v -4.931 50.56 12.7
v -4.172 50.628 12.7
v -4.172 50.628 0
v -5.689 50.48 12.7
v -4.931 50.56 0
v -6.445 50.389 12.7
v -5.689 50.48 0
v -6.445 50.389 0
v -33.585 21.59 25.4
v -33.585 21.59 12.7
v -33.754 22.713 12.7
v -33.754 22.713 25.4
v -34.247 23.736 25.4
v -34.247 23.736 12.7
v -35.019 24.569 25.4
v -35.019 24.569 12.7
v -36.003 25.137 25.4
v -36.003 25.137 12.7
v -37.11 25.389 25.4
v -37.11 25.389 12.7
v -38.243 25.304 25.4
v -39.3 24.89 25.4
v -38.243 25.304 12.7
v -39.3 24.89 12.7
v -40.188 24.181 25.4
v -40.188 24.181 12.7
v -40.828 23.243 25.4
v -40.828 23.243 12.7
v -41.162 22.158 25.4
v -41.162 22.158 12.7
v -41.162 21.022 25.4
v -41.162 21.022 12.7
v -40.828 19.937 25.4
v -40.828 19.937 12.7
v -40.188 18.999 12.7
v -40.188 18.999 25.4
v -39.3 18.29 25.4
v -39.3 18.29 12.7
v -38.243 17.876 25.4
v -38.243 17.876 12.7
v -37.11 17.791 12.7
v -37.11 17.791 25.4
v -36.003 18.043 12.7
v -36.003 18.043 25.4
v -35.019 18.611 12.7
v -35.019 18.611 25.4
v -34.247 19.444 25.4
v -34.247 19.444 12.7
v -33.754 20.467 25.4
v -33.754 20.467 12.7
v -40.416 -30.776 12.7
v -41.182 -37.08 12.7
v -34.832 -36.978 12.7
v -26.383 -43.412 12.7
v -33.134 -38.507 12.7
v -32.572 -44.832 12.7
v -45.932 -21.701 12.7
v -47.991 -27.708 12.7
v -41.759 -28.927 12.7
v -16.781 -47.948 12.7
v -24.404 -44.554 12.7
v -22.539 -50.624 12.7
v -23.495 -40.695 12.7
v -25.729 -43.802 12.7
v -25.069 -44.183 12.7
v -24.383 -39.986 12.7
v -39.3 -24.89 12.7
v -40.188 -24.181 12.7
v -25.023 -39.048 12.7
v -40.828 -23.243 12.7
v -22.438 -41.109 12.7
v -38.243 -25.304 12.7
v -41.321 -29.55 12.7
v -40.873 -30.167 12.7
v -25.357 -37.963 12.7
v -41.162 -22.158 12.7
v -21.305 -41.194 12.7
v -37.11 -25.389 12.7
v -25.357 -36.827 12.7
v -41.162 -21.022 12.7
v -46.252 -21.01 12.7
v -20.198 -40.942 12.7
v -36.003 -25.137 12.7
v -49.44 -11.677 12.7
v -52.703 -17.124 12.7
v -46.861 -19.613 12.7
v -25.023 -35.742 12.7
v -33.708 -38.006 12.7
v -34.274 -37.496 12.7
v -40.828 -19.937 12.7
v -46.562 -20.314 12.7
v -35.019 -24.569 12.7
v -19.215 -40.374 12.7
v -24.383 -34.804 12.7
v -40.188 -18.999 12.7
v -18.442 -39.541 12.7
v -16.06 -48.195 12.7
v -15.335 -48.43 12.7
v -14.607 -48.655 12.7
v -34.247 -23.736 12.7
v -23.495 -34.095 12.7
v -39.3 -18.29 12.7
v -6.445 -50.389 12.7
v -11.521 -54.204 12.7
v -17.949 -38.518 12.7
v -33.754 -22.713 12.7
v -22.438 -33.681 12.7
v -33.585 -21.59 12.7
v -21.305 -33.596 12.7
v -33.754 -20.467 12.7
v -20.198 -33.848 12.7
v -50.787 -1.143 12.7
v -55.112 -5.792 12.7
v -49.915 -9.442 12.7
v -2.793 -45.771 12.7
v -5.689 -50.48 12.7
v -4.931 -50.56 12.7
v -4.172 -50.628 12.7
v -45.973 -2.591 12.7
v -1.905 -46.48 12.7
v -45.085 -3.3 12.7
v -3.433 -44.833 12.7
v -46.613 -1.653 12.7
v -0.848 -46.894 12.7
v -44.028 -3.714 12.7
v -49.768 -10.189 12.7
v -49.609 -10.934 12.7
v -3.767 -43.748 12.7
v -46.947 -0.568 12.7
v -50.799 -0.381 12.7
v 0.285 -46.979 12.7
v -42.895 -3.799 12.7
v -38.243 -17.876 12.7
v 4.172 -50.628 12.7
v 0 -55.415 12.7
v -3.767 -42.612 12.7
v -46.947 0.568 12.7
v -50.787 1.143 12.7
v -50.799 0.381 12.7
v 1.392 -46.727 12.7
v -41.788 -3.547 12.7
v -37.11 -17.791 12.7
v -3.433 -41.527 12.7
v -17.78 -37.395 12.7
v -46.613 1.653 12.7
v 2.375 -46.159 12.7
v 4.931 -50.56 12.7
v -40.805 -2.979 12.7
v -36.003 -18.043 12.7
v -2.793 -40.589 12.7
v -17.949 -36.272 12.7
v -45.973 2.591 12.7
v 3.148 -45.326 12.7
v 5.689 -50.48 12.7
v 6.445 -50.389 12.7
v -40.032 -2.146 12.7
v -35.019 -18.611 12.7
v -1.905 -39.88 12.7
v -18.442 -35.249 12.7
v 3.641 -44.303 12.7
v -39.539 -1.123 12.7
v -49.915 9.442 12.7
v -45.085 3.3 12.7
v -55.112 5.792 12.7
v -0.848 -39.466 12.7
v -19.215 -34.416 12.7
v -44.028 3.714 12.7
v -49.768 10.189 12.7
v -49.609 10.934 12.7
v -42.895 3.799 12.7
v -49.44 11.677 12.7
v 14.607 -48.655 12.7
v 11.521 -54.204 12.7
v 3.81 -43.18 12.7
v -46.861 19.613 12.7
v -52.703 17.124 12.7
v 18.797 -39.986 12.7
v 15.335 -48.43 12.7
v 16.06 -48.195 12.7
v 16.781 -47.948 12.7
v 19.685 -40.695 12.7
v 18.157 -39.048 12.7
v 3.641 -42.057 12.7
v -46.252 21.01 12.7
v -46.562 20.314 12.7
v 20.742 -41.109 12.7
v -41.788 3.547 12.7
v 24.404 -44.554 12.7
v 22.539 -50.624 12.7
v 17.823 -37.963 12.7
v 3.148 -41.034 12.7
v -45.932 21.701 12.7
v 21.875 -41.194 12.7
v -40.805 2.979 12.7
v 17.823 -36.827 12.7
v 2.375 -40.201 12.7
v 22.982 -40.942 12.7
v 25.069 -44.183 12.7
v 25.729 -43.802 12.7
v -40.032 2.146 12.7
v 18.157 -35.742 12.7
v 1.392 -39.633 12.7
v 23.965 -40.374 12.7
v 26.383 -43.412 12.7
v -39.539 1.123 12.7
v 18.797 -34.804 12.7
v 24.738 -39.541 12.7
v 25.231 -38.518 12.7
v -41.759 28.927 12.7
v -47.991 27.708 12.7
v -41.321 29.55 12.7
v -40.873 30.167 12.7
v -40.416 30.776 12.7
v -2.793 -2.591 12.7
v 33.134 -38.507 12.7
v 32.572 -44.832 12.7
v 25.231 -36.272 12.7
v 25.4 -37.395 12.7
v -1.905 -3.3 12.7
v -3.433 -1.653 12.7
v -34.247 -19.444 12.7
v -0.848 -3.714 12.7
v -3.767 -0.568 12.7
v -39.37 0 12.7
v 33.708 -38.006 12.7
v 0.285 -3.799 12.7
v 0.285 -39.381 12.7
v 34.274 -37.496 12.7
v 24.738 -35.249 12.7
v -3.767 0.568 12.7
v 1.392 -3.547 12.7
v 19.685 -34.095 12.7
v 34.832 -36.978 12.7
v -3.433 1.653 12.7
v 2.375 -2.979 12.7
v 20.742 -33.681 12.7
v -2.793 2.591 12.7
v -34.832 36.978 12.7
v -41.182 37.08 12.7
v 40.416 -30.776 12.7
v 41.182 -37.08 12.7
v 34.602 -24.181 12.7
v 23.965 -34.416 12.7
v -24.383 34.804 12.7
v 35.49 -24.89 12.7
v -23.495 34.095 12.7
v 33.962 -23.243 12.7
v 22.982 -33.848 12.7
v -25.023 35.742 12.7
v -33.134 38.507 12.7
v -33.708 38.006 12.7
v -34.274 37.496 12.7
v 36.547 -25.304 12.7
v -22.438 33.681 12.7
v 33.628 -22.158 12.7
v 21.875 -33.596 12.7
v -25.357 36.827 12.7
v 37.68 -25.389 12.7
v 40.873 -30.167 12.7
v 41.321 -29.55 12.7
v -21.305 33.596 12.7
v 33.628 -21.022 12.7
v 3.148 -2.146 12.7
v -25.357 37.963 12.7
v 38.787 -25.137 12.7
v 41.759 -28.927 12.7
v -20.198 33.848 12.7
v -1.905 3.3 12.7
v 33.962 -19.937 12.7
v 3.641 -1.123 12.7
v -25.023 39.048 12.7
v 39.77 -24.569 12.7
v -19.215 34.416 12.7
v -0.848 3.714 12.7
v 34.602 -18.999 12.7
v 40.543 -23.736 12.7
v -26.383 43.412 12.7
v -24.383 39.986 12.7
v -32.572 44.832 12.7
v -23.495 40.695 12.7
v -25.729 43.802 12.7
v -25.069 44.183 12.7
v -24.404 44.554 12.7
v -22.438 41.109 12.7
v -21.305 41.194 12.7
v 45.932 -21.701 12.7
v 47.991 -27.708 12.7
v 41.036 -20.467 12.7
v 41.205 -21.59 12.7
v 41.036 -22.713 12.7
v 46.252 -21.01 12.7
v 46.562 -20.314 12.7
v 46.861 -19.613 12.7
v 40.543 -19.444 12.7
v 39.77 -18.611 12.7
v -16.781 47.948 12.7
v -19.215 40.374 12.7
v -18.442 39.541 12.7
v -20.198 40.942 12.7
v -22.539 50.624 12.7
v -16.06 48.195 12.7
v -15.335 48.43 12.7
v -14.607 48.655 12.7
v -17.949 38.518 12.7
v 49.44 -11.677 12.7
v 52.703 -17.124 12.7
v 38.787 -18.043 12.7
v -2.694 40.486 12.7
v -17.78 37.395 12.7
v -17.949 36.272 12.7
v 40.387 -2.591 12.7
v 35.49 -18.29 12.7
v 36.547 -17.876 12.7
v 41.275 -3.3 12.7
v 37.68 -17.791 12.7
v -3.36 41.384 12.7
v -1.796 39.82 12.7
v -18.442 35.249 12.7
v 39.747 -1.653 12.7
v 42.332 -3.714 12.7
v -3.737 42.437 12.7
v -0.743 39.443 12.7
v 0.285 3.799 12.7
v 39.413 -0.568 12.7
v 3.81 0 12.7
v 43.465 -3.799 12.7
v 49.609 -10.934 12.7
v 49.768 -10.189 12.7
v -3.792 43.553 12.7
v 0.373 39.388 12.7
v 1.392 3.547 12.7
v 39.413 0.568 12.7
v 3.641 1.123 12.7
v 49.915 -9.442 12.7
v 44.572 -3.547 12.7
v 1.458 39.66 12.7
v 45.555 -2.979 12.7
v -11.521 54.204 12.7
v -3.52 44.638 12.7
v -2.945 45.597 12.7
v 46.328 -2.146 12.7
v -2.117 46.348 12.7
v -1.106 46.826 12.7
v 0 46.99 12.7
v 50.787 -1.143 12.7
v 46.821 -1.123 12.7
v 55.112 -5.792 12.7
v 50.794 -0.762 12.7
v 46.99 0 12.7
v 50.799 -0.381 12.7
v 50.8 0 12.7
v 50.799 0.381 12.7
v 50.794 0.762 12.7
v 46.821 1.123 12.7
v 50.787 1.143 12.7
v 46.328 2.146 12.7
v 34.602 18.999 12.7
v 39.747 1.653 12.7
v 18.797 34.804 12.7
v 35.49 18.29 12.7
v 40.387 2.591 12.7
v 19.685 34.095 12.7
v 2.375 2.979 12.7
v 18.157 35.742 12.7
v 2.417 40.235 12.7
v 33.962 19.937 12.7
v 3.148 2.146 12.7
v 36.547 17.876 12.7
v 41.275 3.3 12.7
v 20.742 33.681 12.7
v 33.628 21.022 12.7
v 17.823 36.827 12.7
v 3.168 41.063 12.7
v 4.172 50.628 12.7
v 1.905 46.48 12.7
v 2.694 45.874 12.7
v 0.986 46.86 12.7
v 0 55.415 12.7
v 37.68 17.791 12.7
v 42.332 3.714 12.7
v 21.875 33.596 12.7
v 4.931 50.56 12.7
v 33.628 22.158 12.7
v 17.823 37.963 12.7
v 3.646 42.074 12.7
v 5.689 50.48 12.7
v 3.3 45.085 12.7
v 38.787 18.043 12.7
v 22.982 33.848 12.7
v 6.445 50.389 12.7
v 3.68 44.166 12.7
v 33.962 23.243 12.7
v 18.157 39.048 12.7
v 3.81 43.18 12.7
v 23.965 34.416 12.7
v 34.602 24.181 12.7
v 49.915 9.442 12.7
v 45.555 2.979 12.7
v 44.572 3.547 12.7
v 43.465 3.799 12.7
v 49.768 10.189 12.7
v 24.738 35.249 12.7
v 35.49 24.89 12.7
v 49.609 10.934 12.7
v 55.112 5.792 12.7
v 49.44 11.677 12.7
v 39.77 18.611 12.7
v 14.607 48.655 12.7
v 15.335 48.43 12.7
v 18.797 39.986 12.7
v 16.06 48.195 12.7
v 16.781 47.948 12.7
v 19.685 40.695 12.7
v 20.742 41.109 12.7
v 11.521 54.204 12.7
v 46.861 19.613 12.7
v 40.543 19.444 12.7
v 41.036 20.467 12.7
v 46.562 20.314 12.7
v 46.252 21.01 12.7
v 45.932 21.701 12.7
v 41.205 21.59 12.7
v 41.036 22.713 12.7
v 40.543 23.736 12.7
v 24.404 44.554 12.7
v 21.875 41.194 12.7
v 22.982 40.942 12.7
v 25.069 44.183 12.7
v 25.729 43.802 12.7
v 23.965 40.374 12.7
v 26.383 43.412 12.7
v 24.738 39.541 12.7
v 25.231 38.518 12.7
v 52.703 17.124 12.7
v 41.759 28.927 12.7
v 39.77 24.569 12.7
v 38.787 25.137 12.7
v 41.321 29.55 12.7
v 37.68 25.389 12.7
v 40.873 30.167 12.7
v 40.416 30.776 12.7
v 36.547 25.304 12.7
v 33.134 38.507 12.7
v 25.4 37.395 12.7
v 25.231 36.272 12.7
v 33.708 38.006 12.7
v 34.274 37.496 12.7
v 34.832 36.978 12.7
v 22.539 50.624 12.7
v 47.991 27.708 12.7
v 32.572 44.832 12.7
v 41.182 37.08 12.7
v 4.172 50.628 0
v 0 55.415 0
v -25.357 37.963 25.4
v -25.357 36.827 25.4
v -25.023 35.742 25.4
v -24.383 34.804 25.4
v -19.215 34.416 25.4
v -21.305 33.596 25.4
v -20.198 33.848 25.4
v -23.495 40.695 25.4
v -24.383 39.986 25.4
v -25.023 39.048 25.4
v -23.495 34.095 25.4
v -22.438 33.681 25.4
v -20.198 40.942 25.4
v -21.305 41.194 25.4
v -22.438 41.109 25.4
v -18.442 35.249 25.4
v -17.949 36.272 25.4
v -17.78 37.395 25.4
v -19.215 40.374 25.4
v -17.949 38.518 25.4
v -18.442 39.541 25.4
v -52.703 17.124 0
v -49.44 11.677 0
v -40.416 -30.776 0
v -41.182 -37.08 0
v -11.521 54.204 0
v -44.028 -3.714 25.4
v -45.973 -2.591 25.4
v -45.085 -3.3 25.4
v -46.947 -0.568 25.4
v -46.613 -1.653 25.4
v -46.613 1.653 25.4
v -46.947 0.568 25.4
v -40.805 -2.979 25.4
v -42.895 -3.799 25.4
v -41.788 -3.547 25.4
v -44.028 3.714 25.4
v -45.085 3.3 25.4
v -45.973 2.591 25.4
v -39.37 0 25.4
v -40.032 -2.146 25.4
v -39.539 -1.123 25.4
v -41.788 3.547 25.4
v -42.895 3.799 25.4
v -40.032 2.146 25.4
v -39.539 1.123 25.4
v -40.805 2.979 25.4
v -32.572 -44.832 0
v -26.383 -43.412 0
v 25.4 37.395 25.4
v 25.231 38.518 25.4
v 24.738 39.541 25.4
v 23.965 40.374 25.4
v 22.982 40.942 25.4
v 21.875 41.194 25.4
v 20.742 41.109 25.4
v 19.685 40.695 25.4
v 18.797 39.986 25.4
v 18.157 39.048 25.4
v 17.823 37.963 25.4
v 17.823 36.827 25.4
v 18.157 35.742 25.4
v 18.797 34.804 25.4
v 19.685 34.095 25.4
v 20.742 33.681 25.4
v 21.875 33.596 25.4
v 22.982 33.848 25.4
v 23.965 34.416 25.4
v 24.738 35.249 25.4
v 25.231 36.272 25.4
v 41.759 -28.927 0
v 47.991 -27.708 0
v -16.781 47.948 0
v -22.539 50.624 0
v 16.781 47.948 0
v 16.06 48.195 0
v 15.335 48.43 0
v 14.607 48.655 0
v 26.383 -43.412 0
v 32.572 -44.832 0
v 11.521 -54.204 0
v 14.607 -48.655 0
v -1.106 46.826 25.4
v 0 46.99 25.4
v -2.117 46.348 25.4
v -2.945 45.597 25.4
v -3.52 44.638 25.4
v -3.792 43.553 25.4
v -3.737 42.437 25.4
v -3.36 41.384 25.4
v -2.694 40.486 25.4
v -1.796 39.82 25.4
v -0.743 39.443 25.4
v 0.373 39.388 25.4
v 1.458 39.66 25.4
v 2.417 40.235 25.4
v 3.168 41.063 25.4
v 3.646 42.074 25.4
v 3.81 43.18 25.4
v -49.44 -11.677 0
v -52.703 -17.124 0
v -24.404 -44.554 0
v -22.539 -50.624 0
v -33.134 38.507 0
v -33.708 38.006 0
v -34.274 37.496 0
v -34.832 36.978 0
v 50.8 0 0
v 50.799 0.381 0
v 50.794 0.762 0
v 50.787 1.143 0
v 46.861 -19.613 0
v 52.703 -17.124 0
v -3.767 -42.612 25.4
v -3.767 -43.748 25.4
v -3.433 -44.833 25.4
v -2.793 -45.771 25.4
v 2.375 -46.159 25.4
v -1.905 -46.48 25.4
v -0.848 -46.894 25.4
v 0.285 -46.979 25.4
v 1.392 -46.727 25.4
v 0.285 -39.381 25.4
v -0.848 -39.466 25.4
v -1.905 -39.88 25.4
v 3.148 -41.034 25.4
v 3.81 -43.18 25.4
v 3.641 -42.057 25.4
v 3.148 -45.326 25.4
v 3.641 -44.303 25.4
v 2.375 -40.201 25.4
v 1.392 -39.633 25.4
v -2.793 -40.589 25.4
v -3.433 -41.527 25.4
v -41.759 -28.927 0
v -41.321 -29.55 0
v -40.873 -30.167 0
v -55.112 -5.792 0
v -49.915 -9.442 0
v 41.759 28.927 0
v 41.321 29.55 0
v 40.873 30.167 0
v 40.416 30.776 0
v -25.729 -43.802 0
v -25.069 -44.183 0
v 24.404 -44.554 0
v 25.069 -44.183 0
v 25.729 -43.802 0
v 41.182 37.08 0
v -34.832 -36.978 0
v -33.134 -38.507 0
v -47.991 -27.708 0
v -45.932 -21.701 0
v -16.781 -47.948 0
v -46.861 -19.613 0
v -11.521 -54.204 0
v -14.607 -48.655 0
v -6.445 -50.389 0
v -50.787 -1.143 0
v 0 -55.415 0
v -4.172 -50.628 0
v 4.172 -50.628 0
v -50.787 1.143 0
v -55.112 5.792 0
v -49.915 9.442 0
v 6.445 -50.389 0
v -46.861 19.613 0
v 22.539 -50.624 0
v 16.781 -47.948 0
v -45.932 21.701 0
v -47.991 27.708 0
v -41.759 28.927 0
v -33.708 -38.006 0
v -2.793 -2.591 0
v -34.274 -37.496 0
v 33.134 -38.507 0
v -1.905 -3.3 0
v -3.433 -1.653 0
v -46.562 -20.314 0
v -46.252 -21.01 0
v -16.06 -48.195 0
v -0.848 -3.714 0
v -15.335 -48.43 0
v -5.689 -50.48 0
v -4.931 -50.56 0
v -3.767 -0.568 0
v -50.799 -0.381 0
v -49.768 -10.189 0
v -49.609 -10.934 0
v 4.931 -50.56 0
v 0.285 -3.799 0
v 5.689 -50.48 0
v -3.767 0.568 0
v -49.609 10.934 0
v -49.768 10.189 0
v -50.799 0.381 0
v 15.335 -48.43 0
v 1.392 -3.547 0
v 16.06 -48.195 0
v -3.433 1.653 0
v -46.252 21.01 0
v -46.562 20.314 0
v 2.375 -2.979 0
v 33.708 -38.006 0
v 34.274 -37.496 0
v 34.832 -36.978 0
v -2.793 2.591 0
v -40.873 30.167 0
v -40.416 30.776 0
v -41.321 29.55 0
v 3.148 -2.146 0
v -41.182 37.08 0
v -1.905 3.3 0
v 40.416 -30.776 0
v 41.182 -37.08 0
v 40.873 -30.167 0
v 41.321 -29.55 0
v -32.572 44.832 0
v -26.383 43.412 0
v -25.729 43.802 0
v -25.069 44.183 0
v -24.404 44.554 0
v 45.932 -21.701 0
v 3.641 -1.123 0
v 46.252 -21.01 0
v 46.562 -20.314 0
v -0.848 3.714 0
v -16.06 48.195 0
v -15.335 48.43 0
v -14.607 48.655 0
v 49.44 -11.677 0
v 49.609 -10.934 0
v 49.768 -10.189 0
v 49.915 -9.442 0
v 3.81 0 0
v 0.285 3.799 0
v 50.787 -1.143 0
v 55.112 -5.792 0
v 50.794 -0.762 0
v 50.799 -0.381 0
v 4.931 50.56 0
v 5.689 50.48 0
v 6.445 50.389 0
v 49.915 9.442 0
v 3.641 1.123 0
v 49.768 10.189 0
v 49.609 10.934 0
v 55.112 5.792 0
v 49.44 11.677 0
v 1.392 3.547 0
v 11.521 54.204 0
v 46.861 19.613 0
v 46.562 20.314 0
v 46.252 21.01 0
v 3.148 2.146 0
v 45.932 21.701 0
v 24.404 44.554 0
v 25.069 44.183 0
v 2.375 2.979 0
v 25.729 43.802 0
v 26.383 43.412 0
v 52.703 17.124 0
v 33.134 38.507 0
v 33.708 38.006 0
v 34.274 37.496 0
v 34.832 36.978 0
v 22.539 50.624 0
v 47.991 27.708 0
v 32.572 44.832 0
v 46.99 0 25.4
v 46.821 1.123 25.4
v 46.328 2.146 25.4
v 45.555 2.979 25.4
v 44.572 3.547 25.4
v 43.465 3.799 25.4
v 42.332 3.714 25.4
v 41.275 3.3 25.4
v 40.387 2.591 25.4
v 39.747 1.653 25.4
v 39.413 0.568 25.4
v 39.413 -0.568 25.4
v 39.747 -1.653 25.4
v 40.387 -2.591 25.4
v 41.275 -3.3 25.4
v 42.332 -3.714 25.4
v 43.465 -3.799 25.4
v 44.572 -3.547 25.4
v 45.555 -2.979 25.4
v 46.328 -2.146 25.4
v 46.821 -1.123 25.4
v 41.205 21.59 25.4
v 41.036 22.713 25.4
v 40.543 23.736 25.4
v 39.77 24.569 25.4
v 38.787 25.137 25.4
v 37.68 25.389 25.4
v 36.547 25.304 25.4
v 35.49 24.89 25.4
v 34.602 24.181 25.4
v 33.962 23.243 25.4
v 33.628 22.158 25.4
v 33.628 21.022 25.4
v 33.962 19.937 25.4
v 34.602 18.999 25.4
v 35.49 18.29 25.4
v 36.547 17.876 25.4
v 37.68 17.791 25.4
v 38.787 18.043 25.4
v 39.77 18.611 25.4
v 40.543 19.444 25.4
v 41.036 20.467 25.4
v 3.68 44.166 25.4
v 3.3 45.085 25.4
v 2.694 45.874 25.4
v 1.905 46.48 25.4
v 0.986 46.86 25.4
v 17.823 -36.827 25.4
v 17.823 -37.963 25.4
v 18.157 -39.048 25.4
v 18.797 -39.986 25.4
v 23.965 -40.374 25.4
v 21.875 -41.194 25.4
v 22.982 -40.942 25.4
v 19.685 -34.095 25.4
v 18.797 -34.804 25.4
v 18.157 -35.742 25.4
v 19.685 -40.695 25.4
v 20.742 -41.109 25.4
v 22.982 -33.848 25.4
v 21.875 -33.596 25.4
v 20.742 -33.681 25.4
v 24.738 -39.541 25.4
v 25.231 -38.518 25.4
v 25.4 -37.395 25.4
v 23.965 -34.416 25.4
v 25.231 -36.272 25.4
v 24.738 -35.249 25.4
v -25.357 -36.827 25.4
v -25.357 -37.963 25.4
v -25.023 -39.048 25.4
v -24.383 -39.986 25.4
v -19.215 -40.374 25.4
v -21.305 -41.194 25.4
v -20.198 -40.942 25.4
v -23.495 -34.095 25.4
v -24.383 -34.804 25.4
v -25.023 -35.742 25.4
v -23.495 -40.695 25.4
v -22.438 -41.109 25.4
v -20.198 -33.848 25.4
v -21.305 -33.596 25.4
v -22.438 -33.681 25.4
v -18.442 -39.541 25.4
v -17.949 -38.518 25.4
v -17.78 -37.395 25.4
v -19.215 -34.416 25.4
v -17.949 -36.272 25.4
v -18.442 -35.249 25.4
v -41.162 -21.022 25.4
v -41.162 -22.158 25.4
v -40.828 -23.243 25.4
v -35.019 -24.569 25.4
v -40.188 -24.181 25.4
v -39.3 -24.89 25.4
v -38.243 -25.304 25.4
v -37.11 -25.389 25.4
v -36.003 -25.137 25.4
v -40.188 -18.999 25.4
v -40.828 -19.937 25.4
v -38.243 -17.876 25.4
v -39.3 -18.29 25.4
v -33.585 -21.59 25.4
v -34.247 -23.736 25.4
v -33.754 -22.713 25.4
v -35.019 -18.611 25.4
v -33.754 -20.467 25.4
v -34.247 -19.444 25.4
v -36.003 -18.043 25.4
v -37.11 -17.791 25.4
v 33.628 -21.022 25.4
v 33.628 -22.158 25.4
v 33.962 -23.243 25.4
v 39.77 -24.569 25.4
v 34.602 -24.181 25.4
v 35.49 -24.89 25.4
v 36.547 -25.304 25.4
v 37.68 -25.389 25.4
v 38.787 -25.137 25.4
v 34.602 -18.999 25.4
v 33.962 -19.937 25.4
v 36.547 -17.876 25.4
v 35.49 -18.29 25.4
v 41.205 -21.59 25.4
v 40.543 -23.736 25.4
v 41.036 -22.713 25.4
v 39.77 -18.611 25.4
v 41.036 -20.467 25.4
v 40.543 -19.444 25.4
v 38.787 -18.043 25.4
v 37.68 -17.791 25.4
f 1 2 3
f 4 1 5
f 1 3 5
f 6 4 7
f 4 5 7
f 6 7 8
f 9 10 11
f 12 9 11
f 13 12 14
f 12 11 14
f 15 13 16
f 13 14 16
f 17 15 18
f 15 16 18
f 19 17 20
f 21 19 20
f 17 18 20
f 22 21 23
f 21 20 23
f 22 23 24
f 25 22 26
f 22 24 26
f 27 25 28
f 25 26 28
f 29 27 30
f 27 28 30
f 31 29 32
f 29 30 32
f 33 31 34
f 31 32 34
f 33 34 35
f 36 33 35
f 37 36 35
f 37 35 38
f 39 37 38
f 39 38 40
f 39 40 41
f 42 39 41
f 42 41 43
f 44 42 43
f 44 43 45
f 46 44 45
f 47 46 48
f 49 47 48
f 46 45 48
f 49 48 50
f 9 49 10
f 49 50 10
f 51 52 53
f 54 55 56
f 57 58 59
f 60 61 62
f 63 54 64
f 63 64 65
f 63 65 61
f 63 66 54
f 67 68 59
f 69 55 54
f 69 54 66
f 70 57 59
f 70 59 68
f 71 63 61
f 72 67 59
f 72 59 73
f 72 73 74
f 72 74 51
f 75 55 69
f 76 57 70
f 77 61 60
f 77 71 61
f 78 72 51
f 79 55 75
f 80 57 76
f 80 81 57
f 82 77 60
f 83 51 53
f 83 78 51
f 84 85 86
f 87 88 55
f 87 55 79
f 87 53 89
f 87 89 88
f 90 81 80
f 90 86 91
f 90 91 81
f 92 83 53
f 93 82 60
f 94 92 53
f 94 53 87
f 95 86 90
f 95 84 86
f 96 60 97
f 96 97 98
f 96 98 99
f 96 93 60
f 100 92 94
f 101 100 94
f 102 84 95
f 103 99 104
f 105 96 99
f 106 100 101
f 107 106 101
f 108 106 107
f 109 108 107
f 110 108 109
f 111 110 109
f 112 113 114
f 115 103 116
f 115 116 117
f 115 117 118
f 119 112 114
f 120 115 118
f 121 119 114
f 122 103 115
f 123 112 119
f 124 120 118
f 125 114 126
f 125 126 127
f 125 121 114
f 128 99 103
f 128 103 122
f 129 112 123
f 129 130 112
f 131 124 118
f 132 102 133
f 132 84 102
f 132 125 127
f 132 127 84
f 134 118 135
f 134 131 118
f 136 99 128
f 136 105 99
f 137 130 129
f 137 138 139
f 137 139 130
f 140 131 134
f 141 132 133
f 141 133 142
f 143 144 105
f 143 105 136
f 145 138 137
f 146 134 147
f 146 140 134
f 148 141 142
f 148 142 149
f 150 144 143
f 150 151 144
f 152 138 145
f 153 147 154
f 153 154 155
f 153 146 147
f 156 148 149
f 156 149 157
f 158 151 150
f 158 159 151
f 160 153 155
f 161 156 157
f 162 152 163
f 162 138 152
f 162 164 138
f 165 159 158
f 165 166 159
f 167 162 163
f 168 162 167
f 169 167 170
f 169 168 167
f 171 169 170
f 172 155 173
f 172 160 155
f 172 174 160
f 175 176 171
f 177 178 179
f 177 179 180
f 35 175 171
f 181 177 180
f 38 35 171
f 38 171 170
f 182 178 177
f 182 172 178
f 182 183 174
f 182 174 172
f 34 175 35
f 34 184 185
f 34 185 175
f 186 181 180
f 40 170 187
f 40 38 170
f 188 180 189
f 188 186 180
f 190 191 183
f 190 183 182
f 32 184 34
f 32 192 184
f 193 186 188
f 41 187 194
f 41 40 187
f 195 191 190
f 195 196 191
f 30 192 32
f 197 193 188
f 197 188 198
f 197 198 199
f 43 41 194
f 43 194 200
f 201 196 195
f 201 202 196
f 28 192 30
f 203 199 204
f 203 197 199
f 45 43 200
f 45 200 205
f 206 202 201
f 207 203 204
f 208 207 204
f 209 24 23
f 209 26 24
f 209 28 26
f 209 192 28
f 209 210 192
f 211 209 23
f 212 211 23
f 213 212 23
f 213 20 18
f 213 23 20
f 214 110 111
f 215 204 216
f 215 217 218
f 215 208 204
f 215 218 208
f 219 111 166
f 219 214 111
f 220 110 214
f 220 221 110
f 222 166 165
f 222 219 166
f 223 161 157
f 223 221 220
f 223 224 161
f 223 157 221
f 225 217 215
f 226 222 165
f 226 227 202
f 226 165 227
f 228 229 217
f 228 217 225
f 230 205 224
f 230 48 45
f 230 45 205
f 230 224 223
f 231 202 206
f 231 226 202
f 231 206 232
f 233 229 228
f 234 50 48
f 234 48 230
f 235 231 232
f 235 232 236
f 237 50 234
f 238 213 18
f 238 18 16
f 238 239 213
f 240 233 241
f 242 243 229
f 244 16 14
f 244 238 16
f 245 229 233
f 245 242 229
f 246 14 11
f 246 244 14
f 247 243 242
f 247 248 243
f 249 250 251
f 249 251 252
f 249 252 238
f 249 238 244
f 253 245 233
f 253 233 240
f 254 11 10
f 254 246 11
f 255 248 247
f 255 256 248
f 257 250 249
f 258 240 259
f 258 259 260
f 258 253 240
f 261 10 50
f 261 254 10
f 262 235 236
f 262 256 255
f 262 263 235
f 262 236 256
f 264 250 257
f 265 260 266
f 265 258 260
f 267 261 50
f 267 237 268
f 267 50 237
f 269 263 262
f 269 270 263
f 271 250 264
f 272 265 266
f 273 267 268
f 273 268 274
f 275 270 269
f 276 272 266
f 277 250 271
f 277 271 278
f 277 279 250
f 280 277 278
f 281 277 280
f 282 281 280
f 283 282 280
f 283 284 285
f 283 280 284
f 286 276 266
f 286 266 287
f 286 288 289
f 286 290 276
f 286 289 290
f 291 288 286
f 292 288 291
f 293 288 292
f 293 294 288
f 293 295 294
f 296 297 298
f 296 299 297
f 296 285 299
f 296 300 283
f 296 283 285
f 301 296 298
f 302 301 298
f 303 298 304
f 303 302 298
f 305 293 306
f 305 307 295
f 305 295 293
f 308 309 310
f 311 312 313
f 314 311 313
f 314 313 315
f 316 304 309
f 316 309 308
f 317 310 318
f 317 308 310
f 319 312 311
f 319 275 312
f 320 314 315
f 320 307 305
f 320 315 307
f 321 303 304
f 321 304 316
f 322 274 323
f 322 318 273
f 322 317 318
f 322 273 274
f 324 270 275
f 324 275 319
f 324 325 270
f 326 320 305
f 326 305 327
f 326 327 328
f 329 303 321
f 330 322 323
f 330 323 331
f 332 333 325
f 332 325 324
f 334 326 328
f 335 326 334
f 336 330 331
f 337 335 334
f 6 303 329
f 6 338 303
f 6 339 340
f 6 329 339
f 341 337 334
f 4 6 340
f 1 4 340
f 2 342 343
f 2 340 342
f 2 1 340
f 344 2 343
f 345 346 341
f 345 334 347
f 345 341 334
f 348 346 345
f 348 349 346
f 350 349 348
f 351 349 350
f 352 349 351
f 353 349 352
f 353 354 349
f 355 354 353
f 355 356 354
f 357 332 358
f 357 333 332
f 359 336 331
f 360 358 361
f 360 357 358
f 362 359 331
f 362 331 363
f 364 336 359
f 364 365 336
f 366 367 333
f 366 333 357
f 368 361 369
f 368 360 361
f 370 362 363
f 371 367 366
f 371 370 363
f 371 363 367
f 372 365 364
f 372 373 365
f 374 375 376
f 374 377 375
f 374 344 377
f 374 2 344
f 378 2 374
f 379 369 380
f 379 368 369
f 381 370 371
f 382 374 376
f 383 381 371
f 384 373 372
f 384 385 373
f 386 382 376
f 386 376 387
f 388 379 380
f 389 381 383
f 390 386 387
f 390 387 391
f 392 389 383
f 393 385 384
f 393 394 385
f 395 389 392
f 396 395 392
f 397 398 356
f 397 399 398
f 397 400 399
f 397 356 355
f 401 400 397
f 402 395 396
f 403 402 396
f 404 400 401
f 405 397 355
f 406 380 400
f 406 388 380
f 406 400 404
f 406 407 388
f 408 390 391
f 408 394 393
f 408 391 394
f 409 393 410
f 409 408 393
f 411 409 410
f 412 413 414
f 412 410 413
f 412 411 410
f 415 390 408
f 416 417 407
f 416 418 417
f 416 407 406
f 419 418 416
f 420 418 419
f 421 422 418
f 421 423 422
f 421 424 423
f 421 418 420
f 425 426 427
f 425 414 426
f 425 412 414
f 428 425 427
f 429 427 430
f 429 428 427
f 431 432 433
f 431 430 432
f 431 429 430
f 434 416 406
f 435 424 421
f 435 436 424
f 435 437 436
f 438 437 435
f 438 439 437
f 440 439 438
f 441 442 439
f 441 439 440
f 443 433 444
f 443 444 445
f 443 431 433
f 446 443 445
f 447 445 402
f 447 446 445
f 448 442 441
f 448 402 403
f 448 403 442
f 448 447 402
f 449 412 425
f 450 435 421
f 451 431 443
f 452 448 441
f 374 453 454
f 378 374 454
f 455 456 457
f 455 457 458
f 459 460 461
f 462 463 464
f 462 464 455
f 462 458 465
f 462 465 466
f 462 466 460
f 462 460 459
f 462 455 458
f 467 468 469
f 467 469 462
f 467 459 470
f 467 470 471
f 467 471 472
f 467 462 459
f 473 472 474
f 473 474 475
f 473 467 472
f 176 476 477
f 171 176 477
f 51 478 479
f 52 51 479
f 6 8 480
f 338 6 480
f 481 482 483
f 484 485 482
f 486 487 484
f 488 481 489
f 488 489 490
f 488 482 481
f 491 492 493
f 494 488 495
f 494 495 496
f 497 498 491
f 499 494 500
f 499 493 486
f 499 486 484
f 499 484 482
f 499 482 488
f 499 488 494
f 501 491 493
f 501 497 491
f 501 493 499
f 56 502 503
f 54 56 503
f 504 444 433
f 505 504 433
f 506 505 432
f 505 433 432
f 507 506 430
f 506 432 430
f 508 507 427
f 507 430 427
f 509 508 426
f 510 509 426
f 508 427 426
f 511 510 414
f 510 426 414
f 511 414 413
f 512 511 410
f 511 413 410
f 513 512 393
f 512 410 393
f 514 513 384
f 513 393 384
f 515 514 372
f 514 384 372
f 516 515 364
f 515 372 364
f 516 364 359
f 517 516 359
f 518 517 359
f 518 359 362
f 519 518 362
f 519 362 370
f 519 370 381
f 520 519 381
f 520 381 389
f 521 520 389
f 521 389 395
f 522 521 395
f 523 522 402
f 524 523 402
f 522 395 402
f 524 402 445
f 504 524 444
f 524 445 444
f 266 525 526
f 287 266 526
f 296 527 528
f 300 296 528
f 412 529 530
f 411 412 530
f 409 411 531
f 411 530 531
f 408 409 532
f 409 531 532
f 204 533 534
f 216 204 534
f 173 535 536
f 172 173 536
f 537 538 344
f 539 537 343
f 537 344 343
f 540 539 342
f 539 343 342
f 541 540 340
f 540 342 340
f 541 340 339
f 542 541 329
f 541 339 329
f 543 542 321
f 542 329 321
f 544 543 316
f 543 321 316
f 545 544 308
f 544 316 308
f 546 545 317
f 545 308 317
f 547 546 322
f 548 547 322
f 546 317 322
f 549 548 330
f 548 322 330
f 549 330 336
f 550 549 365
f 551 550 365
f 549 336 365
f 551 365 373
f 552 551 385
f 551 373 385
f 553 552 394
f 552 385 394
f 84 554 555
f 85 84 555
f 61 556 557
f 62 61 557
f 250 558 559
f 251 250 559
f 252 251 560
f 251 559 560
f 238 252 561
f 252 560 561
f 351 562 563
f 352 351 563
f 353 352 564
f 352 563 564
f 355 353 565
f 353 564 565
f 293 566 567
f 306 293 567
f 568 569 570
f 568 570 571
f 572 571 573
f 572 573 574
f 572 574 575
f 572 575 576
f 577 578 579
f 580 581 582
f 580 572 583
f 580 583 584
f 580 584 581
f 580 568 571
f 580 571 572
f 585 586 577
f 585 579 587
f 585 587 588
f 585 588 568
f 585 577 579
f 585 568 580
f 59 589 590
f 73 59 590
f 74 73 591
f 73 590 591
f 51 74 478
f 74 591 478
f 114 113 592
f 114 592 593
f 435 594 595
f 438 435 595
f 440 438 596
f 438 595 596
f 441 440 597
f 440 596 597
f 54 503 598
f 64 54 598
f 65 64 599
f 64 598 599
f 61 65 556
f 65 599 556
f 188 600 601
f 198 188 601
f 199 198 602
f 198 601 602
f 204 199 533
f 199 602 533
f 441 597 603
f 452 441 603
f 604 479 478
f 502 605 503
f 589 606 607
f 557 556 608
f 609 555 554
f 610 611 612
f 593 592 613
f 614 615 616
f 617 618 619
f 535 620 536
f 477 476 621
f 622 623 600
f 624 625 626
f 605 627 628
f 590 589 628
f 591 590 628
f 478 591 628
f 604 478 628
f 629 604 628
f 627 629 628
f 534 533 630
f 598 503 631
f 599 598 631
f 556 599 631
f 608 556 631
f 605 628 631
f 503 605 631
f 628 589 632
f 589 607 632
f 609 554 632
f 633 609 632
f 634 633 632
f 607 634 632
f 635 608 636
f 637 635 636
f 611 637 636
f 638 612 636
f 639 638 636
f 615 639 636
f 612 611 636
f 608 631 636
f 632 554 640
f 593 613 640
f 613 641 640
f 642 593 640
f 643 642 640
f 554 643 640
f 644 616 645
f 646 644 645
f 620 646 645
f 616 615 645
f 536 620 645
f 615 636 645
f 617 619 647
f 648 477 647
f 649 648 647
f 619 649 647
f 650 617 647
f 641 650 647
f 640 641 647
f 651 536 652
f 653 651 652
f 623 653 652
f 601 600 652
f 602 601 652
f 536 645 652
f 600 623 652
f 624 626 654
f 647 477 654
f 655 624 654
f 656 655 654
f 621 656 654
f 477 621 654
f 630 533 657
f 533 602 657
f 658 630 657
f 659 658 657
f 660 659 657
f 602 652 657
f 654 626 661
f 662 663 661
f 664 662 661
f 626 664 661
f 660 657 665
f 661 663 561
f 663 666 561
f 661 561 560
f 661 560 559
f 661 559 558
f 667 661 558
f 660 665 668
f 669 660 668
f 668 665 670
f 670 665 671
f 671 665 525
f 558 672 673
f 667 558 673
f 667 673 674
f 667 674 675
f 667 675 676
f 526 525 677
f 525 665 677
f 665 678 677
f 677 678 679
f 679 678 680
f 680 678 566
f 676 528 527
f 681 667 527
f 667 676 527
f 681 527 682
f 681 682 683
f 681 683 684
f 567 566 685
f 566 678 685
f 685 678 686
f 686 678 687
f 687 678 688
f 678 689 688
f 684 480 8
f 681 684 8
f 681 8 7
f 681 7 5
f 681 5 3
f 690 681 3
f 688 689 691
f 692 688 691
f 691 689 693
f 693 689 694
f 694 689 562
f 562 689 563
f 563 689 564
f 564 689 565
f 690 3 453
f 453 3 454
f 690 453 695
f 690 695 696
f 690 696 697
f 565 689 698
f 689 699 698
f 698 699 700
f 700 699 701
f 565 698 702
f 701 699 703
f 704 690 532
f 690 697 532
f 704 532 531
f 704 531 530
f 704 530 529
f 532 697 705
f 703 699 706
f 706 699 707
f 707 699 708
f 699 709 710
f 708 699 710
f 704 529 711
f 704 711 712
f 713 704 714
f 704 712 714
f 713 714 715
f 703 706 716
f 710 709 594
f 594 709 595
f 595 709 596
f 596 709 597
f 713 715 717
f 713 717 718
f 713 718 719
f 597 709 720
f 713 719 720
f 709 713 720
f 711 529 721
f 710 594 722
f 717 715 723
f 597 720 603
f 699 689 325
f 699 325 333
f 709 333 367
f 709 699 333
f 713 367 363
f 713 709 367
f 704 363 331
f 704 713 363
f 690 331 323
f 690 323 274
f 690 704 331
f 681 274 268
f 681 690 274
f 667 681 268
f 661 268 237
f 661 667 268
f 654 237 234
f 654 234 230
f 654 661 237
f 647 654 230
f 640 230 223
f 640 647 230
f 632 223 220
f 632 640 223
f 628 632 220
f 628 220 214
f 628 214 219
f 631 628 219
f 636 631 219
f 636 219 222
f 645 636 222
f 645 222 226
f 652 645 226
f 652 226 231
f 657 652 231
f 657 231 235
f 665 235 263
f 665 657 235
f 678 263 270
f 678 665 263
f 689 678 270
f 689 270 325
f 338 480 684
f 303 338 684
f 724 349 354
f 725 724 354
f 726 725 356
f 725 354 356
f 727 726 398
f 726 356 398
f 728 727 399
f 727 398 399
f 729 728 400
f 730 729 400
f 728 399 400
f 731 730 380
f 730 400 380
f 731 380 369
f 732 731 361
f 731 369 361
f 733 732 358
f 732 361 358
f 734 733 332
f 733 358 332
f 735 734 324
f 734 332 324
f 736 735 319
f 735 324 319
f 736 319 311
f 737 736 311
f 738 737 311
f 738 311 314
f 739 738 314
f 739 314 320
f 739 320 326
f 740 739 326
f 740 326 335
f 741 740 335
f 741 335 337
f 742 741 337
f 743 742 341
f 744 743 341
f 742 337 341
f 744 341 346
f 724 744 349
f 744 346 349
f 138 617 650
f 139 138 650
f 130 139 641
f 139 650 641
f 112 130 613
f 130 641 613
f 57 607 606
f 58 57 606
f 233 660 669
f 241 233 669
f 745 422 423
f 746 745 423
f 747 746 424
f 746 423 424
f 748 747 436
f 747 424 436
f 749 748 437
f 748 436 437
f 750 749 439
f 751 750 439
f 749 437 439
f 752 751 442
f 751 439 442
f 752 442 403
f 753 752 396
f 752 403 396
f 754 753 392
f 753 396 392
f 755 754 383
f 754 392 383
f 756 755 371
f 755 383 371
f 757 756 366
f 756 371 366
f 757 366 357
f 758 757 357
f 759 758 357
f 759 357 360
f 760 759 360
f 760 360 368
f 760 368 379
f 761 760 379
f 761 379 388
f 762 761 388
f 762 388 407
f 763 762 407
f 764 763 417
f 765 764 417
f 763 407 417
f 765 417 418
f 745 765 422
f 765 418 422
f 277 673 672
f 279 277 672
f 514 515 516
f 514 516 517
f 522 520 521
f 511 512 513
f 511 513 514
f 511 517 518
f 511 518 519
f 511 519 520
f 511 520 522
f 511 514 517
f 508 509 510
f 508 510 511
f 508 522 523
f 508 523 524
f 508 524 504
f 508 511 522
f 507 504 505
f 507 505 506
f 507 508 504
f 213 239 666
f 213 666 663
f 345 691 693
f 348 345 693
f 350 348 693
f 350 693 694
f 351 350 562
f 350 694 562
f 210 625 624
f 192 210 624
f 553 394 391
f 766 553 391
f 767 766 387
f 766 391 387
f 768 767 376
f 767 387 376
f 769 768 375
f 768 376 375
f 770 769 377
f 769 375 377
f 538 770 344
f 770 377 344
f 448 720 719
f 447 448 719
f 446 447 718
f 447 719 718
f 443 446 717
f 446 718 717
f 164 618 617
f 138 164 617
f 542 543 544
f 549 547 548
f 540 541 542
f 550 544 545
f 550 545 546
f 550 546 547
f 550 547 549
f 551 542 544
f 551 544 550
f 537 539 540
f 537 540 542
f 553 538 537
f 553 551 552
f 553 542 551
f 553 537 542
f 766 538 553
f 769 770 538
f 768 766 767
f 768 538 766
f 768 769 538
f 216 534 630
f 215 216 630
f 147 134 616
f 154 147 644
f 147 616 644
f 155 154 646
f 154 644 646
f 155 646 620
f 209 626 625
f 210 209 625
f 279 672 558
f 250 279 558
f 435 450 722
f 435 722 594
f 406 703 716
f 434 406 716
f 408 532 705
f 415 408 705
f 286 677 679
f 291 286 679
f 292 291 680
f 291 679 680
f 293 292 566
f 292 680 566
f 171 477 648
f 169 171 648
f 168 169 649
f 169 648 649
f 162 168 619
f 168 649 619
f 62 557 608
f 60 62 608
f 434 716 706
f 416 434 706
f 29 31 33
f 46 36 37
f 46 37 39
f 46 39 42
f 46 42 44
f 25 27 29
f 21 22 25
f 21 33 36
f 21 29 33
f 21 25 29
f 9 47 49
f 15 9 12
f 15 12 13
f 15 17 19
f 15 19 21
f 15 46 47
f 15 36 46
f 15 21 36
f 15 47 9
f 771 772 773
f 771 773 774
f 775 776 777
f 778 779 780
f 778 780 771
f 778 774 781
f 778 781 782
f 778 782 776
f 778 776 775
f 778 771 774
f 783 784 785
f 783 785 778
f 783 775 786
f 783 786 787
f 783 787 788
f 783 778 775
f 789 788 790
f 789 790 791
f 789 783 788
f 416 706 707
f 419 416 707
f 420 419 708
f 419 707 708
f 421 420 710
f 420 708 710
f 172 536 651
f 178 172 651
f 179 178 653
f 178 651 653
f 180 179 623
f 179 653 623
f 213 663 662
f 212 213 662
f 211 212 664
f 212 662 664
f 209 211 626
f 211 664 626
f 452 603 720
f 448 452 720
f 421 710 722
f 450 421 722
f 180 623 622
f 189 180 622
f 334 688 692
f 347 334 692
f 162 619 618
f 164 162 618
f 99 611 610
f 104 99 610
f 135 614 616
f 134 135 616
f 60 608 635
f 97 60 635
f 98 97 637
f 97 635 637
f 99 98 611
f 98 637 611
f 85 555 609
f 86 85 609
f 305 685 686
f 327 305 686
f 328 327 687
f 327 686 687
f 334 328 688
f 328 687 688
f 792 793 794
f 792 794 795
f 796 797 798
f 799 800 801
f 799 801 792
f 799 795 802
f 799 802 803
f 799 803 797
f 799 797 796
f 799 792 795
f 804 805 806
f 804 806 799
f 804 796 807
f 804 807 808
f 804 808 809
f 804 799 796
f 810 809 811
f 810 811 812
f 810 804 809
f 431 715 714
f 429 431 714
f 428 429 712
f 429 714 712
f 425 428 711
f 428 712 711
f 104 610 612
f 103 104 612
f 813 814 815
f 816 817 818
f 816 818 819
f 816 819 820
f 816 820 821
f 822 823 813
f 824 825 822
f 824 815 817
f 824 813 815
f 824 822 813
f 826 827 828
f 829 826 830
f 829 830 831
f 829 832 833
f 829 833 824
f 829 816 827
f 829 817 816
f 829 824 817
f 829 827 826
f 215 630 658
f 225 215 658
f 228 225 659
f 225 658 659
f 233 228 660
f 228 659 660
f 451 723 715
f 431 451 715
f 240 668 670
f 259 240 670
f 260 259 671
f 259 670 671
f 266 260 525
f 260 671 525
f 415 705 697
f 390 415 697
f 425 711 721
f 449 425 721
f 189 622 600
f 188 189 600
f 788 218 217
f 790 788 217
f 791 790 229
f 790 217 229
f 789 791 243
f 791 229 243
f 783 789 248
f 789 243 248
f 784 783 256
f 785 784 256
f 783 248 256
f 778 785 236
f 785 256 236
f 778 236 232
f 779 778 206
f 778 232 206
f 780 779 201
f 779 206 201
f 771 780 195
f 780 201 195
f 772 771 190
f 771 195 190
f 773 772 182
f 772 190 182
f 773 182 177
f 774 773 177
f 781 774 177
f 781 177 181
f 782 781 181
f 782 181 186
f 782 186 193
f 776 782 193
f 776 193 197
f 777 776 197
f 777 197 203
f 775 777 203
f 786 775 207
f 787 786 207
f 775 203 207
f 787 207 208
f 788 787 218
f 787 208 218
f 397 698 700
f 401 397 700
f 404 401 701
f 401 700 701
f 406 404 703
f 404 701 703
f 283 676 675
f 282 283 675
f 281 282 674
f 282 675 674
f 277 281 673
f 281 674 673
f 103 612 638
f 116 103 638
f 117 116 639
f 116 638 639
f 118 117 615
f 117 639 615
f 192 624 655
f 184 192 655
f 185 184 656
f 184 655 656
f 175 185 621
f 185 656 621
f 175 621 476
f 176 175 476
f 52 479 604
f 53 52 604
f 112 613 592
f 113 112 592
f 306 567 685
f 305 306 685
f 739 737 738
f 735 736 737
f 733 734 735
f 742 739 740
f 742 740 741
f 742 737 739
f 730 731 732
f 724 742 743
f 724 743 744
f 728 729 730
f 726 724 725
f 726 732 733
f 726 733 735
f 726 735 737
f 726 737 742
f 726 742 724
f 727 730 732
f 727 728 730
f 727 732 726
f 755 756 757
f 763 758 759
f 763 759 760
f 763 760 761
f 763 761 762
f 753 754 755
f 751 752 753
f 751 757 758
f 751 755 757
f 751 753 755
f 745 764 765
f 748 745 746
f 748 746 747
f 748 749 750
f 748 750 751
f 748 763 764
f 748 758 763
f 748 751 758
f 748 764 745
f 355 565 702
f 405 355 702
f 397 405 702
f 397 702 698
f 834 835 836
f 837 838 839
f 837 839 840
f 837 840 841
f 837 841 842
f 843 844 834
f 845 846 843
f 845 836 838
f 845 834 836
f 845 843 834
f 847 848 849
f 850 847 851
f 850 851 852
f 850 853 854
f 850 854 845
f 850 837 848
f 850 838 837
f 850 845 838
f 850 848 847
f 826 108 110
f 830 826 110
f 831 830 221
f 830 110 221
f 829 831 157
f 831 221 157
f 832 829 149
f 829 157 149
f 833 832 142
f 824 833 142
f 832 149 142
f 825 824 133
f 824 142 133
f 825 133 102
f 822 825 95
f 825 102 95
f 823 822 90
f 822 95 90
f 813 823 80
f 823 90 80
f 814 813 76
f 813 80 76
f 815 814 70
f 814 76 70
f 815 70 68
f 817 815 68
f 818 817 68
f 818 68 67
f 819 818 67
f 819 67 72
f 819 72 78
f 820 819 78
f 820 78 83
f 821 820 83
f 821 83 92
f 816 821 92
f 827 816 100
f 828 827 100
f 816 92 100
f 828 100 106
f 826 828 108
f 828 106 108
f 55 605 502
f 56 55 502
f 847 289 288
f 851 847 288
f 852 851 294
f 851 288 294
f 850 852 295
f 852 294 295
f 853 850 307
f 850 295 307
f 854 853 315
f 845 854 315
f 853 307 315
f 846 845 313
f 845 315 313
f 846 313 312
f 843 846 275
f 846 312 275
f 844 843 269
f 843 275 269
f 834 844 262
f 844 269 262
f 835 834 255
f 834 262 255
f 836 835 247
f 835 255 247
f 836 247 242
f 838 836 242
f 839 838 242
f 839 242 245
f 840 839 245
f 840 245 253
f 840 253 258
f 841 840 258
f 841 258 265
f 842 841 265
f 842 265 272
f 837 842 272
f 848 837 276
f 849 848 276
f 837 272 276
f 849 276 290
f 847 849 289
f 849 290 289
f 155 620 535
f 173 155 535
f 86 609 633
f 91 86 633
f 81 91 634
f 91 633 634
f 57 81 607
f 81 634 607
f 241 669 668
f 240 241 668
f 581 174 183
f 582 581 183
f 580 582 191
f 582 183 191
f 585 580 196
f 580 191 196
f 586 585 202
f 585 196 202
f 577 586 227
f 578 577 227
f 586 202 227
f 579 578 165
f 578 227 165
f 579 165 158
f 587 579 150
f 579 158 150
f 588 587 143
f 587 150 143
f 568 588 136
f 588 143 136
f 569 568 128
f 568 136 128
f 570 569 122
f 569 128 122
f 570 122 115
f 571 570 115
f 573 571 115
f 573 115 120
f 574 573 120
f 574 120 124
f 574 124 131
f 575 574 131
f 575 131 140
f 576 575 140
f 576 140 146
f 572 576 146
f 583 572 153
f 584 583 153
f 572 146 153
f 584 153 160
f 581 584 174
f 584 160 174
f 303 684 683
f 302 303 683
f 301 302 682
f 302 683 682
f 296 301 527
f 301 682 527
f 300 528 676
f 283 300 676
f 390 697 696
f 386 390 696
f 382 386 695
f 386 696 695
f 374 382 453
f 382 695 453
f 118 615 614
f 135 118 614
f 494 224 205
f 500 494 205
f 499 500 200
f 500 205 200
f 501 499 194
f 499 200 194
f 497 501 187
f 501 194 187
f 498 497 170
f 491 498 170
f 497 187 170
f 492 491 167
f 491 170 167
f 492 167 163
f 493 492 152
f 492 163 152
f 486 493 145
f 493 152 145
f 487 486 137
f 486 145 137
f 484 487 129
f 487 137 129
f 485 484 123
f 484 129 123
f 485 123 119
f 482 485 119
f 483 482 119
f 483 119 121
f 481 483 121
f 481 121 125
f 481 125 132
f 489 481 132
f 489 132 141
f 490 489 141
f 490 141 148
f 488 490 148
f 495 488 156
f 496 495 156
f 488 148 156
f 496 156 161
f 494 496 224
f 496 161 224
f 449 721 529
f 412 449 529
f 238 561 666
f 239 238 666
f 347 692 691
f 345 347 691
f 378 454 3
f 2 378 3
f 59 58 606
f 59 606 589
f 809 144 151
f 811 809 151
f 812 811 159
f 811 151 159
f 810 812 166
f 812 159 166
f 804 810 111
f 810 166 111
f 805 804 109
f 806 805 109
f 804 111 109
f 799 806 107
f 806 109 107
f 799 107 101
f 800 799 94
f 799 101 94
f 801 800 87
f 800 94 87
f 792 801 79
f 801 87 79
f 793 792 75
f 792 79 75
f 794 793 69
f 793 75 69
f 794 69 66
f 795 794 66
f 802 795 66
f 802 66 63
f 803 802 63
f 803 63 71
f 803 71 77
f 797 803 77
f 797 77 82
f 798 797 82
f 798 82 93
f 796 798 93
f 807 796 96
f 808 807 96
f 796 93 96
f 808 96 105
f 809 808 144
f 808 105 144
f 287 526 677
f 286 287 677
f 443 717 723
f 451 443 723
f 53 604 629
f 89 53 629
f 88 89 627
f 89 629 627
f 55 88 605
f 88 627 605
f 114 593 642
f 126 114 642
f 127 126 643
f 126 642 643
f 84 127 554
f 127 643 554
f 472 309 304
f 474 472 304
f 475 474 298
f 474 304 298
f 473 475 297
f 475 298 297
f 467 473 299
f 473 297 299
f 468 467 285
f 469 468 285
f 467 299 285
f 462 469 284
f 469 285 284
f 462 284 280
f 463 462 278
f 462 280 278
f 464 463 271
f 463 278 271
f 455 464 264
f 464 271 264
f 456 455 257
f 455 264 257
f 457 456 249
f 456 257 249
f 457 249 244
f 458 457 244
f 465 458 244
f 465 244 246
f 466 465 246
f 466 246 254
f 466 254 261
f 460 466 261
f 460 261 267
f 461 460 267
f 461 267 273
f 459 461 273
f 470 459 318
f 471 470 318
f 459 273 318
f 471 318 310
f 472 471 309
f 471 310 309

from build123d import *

# Parameters (mm, degrees)
F0_R     = 3.81
F1_DEPTH = 12.7
F2_R     = 3.81
F3_DEPTH = 12.7


with BuildPart() as f1:
    # F0 (on Top) → F1 (new body)
    with BuildSketch(Plane.XY):
        with BuildLine():
            ThreePointArc((50.787147, -1.142667), (50.796787, -0.57137), (50.8, 0))
            ThreePointArc((50.8, 0), (50.796787, 0.57137), (50.787147, 1.142667))
            ThreePointArc((50.787147, 1.142667), (50.521712, 5.310046), (49.9149, 9.441544))
            ThreePointArc((49.9149, 9.441544), (49.689898, 10.561914), (49.439752, 11.676939))
            ThreePointArc((49.439752, 11.676939), (48.313671, 15.698063), (46.861132, 19.613115))
            ThreePointArc((46.861132, 19.613115), (46.408109, 20.662221), (45.931603, 21.700872))
            ThreePointArc((45.931603, 21.700872), (43.994091, 25.4), (41.759308, 28.927499))
            ThreePointArc((41.759308, 28.927499), (41.098063, 29.859491), (40.416022, 30.776373))
            ThreePointArc((40.416022, 30.776373), (37.751757, 33.991835), (34.832402, 36.977612))
            ThreePointArc((34.832402, 36.977612), (33.991835, 37.751757), (33.134067, 38.506799))
            ThreePointArc((33.134067, 38.506799), (29.859491, 41.098063), (26.383152, 43.411626))
            ThreePointArc((26.383152, 43.411626), (25.4, 43.994091), (24.403995, 44.554293))
            ThreePointArc((24.403995, 44.554293), (20.662221, 46.408109), (16.780833, 47.948344))
            ThreePointArc((16.780833, 47.948344), (15.698063, 48.313671), (14.60735, 48.654551))
            ThreePointArc((14.60735, 48.654551), (10.561914, 49.689898), (6.44511, 50.389489))
            ThreePointArc((6.44511, 50.389489), (5.310046, 50.521712), (4.172295, 50.628371))
            ThreePointArc((4.172295, 50.628371), (0, 50.8), (-4.172295, 50.628371))
            ThreePointArc((-4.172295, 50.628371), (-5.310046, 50.521712), (-6.44511, 50.389489))
            ThreePointArc((-6.44511, 50.389489), (-10.561914, 49.689898), (-14.60735, 48.654551))
            ThreePointArc((-14.60735, 48.654551), (-15.698063, 48.313671), (-16.780833, 47.948344))
            ThreePointArc((-16.780833, 47.948344), (-20.662221, 46.408109), (-24.403995, 44.554293))
            ThreePointArc((-24.403995, 44.554293), (-25.4, 43.994091), (-26.383152, 43.411626))
            ThreePointArc((-26.383152, 43.411626), (-29.859491, 41.098063), (-33.134067, 38.506799))
            ThreePointArc((-33.134067, 38.506799), (-33.991835, 37.751757), (-34.832402, 36.977612))
            ThreePointArc((-34.832402, 36.977612), (-37.751757, 33.991835), (-40.416022, 30.776373))
            ThreePointArc((-40.416022, 30.776373), (-41.098063, 29.859491), (-41.759308, 28.927499))
            ThreePointArc((-41.759308, 28.927499), (-43.994091, 25.4), (-45.931603, 21.700872))
            ThreePointArc((-45.931603, 21.700872), (-46.408109, 20.662221), (-46.861132, 19.613115))
            ThreePointArc((-46.861132, 19.613115), (-48.313671, 15.698063), (-49.439752, 11.676939))
            ThreePointArc((-49.439752, 11.676939), (-49.689898, 10.561914), (-49.9149, 9.441544))
            ThreePointArc((-49.9149, 9.441544), (-50.521712, 5.310046), (-50.787147, 1.142667))
            ThreePointArc((-50.787147, 1.142667), (-50.8, 0), (-50.787147, -1.142667))
            ThreePointArc((-50.787147, -1.142667), (-50.521712, -5.310046), (-49.9149, -9.441544))
            ThreePointArc((-49.9149, -9.441544), (-49.689898, -10.561914), (-49.439752, -11.676939))
            ThreePointArc((-49.439752, -11.676939), (-48.313671, -15.698063), (-46.861132, -19.613115))
            ThreePointArc((-46.861132, -19.613115), (-46.408109, -20.662221), (-45.931603, -21.700872))
            ThreePointArc((-45.931603, -21.700872), (-43.994091, -25.4), (-41.759308, -28.927499))
            ThreePointArc((-41.759308, -28.927499), (-41.098063, -29.859491), (-40.416022, -30.776373))
            ThreePointArc((-40.416022, -30.776373), (-37.751757, -33.991835), (-34.832402, -36.977612))
            ThreePointArc((-34.832402, -36.977612), (-33.991835, -37.751757), (-33.134067, -38.506799))
            ThreePointArc((-33.134067, -38.506799), (-29.859491, -41.098063), (-26.383152, -43.411626))
            ThreePointArc((-26.383152, -43.411626), (-25.4, -43.994091), (-24.403995, -44.554293))
            ThreePointArc((-24.403995, -44.554293), (-20.662221, -46.408109), (-16.780833, -47.948344))
            ThreePointArc((-16.780833, -47.948344), (-15.698063, -48.313671), (-14.60735, -48.654551))
            ThreePointArc((-14.60735, -48.654551), (-10.561914, -49.689898), (-6.44511, -50.389489))
            ThreePointArc((-6.44511, -50.389489), (-5.310046, -50.521712), (-4.172295, -50.628371))
            ThreePointArc((-4.172295, -50.628371), (0, -50.8), (4.172295, -50.628371))
            ThreePointArc((4.172295, -50.628371), (5.310046, -50.521712), (6.44511, -50.389489))
            ThreePointArc((6.44511, -50.389489), (10.561914, -49.689898), (14.60735, -48.654551))
            ThreePointArc((14.60735, -48.654551), (15.698063, -48.313671), (16.780833, -47.948344))
            ThreePointArc((16.780833, -47.948344), (20.662221, -46.408109), (24.403995, -44.554293))
            ThreePointArc((24.403995, -44.554293), (25.4, -43.994091), (26.383152, -43.411626))
            ThreePointArc((26.383152, -43.411626), (29.859491, -41.098063), (33.134067, -38.506799))
            ThreePointArc((33.134067, -38.506799), (33.991835, -37.751757), (34.832402, -36.977612))
            ThreePointArc((34.832402, -36.977612), (37.751757, -33.991835), (40.416022, -30.776373))
            ThreePointArc((40.416022, -30.776373), (41.098063, -29.859491), (41.759308, -28.927499))
            ThreePointArc((41.759308, -28.927499), (43.994091, -25.4), (45.931603, -21.700872))
            ThreePointArc((45.931603, -21.700872), (46.408109, -20.662221), (46.861132, -19.613115))
            ThreePointArc((46.861132, -19.613115), (48.313671, -15.698063), (49.439752, -11.676939))
            ThreePointArc((49.439752, -11.676939), (49.689898, -10.561914), (49.9149, -9.441544))
            ThreePointArc((49.9149, -9.441544), (50.521712, -5.310046), (50.787147, -1.142667))
        make_face()
        Circle(F0_R, mode=Mode.SUBTRACT)
        with BuildLine():
            ThreePointArc((49.9149, 9.441544), (50.521712, 5.310046), (50.787147, 1.142667))
            Line((50.787147, 1.142667), (55.111705, 5.792474))
            Line((55.111705, 5.792474), (49.9149, 9.441544))
        make_face()
        with BuildLine():
            Line((55.111705, -5.792474), (50.787147, -1.142667))
            ThreePointArc((50.787147, -1.142667), (50.521712, -5.310046), (49.9149, -9.441544))
            Line((49.9149, -9.441544), (55.111705, -5.792474))
        make_face()
        with BuildLine():
            ThreePointArc((46.861132, 19.613115), (48.313671, 15.698063), (49.439752, 11.676939))
            Line((49.439752, 11.676939), (52.703059, 17.124262))
            Line((52.703059, 17.124262), (46.861132, 19.613115))
        make_face()
        with BuildLine():
            Line((52.703059, -17.124262), (49.439752, -11.676939))
            ThreePointArc((49.439752, -11.676939), (48.313671, -15.698063), (46.861132, -19.613115))
            Line((46.861132, -19.613115), (52.703059, -17.124262))
        make_face()
        with BuildLine():
            ThreePointArc((41.759308, 28.927499), (43.994091, 25.4), (45.931603, 21.700872))
            Line((45.931603, 21.700872), (47.991036, 27.707638))
            Line((47.991036, 27.707638), (41.759308, 28.927499))
        make_face()
        with BuildLine():
            Line((47.991036, -27.707638), (45.931603, -21.700872))
            ThreePointArc((45.931603, -21.700872), (43.994091, -25.4), (41.759308, -28.927499))
            Line((41.759308, -28.927499), (47.991036, -27.707638))
        make_face()
        with BuildLine():
            ThreePointArc((34.832402, 36.977612), (37.751757, 33.991835), (40.416022, 30.776373))
            Line((40.416022, 30.776373), (41.181575, 37.080057))
            Line((41.181575, 37.080057), (34.832402, 36.977612))
        make_face()
        with BuildLine():
            Line((41.181575, -37.080057), (40.416022, -30.776373))
            ThreePointArc((40.416022, -30.776373), (37.751757, -33.991835), (34.832402, -36.977612))
            Line((34.832402, -36.977612), (41.181575, -37.080057))
        make_face()
        with BuildLine():
            ThreePointArc((26.383152, 43.411626), (29.859491, 41.098063), (33.134067, 38.506799))
            Line((33.134067, 38.506799), (32.572282, 44.8319))
            Line((32.572282, 44.8319), (26.383152, 43.411626))
        make_face()
        with BuildLine():
            Line((32.572282, -44.8319), (33.134067, -38.506799))
            ThreePointArc((33.134067, -38.506799), (29.859491, -41.098063), (26.383152, -43.411626))
            Line((26.383152, -43.411626), (32.572282, -44.8319))
        make_face()
        with BuildLine():
            ThreePointArc((16.780833, 47.948344), (20.662221, 46.408109), (24.403995, 44.554293))
            Line((24.403995, 44.554293), (22.539423, 50.624373))
            Line((22.539423, 50.624373), (16.780833, 47.948344))
        make_face()
        with BuildLine():
            Line((22.539423, -50.624373), (24.403995, -44.554293))
            ThreePointArc((24.403995, -44.554293), (20.662221, -46.408109), (16.780833, -47.948344))
            Line((16.780833, -47.948344), (22.539423, -50.624373))
        make_face()
        with BuildLine():
            ThreePointArc((6.44511, 50.389489), (10.561914, 49.689898), (14.60735, 48.654551))
            Line((14.60735, 48.654551), (11.521484, 54.204319))
            Line((11.521484, 54.204319), (6.44511, 50.389489))
        make_face()
        with BuildLine():
            Line((11.521484, -54.204319), (14.60735, -48.654551))
            ThreePointArc((14.60735, -48.654551), (10.561914, -49.689898), (6.44511, -50.389489))
            Line((6.44511, -50.389489), (11.521484, -54.204319))
        make_face()
        with BuildLine():
            ThreePointArc((-4.172295, 50.628371), (0, 50.8), (4.172295, 50.628371))
            Line((4.172295, 50.628371), (0, 55.415276))
            Line((0, 55.415276), (-4.172295, 50.628371))
        make_face()
        with BuildLine():
            Line((0, -55.415276), (4.172295, -50.628371))
            ThreePointArc((4.172295, -50.628371), (0, -50.8), (-4.172295, -50.628371))
            Line((-4.172295, -50.628371), (0, -55.415276))
        make_face()
        with BuildLine():
            ThreePointArc((-14.60735, 48.654551), (-10.561914, 49.689898), (-6.44511, 50.389489))
            Line((-6.44511, 50.389489), (-11.521484, 54.204319))
            Line((-11.521484, 54.204319), (-14.60735, 48.654551))
        make_face()
        with BuildLine():
            Line((-11.521484, -54.204319), (-6.44511, -50.389489))
            ThreePointArc((-6.44511, -50.389489), (-10.561914, -49.689898), (-14.60735, -48.654551))
            Line((-14.60735, -48.654551), (-11.521484, -54.204319))
        make_face()
        with BuildLine():
            ThreePointArc((-24.403995, 44.554293), (-20.662221, 46.408109), (-16.780833, 47.948344))
            Line((-16.780833, 47.948344), (-22.539423, 50.624373))
            Line((-22.539423, 50.624373), (-24.403995, 44.554293))
        make_face()
        with BuildLine():
            Line((-22.539423, -50.624373), (-16.780833, -47.948344))
            ThreePointArc((-16.780833, -47.948344), (-20.662221, -46.408109), (-24.403995, -44.554293))
            Line((-24.403995, -44.554293), (-22.539423, -50.624373))
        make_face()
        with BuildLine():
            ThreePointArc((-33.134067, 38.506799), (-29.859491, 41.098063), (-26.383152, 43.411626))
            Line((-26.383152, 43.411626), (-32.572282, 44.8319))
            Line((-32.572282, 44.8319), (-33.134067, 38.506799))
        make_face()
        with BuildLine():
            Line((-32.572282, -44.8319), (-26.383152, -43.411626))
            ThreePointArc((-26.383152, -43.411626), (-29.859491, -41.098063), (-33.134067, -38.506799))
            Line((-33.134067, -38.506799), (-32.572282, -44.8319))
        make_face()
        with BuildLine():
            ThreePointArc((-40.416022, 30.776373), (-37.751757, 33.991835), (-34.832402, 36.977612))
            Line((-34.832402, 36.977612), (-41.181575, 37.080057))
            Line((-41.181575, 37.080057), (-40.416022, 30.776373))
        make_face()
        with BuildLine():
            Line((-41.181575, -37.080057), (-34.832402, -36.977612))
            ThreePointArc((-34.832402, -36.977612), (-37.751757, -33.991835), (-40.416022, -30.776373))
            Line((-40.416022, -30.776373), (-41.181575, -37.080057))
        make_face()
        with BuildLine():
            ThreePointArc((-45.931603, 21.700872), (-43.994091, 25.4), (-41.759308, 28.927499))
            Line((-41.759308, 28.927499), (-47.991036, 27.707638))
            Line((-47.991036, 27.707638), (-45.931603, 21.700872))
        make_face()
        with BuildLine():
            Line((-47.991036, -27.707638), (-41.759308, -28.927499))
            ThreePointArc((-41.759308, -28.927499), (-43.994091, -25.4), (-45.931603, -21.700872))
            Line((-45.931603, -21.700872), (-47.991036, -27.707638))
        make_face()
        with BuildLine():
            ThreePointArc((-49.439752, 11.676939), (-48.313671, 15.698063), (-46.861132, 19.613115))
            Line((-46.861132, 19.613115), (-52.703059, 17.124262))
            Line((-52.703059, 17.124262), (-49.439752, 11.676939))
        make_face()
        with BuildLine():
            Line((-52.703059, -17.124262), (-46.861132, -19.613115))
            ThreePointArc((-46.861132, -19.613115), (-48.313671, -15.698063), (-49.439752, -11.676939))
            Line((-49.439752, -11.676939), (-52.703059, -17.124262))
        make_face()
        with BuildLine():
            ThreePointArc((-50.787147, 1.142667), (-50.521712, 5.310046), (-49.9149, 9.441544))
            Line((-49.9149, 9.441544), (-55.111705, 5.792474))
            Line((-55.111705, 5.792474), (-50.787147, 1.142667))
        make_face()
        with BuildLine():
            Line((-55.111705, -5.792474), (-49.9149, -9.441544))
            ThreePointArc((-49.9149, -9.441544), (-50.521712, -5.310046), (-50.787147, -1.142667))
            Line((-50.787147, -1.142667), (-55.111705, -5.792474))
        make_face()
    extrude(amount=F1_DEPTH)

    # F2 (on face) → F3 (join)
    with BuildSketch(Plane.XY.offset(12.7)):
        with Locations((-21.59, -37.394977)):
            Circle(F2_R)
        with Locations((-37.394977, -21.59)):
            Circle(F2_R)
        with Locations((-43.18, 0)):
            Circle(F2_R)
        with Locations((-37.394977, 21.59)):
            Circle(F2_R)
        with Locations((-21.59, 37.394977)):
            Circle(F2_R)
        with BuildLine():
            ThreePointArc((0, 46.99), (-2.694077, 40.485923), (3.81, 43.18))
            ThreePointArc((3.81, 43.18), (2.694077, 45.874077), (0, 46.99))
        make_face()
        with Locations((21.59, 37.394977)):
            Circle(F2_R)
        with Locations((37.394977, 21.59)):
            Circle(F2_R)
        with Locations((43.18, 0)):
            Circle(F2_R)
        with Locations((37.394977, -21.59)):
            Circle(F2_R)
        with Locations((21.59, -37.394977)):
            Circle(F2_R)
        with Locations((0, -43.18)):
            Circle(F2_R)
    extrude(amount=F3_DEPTH)


solid = f1.part
